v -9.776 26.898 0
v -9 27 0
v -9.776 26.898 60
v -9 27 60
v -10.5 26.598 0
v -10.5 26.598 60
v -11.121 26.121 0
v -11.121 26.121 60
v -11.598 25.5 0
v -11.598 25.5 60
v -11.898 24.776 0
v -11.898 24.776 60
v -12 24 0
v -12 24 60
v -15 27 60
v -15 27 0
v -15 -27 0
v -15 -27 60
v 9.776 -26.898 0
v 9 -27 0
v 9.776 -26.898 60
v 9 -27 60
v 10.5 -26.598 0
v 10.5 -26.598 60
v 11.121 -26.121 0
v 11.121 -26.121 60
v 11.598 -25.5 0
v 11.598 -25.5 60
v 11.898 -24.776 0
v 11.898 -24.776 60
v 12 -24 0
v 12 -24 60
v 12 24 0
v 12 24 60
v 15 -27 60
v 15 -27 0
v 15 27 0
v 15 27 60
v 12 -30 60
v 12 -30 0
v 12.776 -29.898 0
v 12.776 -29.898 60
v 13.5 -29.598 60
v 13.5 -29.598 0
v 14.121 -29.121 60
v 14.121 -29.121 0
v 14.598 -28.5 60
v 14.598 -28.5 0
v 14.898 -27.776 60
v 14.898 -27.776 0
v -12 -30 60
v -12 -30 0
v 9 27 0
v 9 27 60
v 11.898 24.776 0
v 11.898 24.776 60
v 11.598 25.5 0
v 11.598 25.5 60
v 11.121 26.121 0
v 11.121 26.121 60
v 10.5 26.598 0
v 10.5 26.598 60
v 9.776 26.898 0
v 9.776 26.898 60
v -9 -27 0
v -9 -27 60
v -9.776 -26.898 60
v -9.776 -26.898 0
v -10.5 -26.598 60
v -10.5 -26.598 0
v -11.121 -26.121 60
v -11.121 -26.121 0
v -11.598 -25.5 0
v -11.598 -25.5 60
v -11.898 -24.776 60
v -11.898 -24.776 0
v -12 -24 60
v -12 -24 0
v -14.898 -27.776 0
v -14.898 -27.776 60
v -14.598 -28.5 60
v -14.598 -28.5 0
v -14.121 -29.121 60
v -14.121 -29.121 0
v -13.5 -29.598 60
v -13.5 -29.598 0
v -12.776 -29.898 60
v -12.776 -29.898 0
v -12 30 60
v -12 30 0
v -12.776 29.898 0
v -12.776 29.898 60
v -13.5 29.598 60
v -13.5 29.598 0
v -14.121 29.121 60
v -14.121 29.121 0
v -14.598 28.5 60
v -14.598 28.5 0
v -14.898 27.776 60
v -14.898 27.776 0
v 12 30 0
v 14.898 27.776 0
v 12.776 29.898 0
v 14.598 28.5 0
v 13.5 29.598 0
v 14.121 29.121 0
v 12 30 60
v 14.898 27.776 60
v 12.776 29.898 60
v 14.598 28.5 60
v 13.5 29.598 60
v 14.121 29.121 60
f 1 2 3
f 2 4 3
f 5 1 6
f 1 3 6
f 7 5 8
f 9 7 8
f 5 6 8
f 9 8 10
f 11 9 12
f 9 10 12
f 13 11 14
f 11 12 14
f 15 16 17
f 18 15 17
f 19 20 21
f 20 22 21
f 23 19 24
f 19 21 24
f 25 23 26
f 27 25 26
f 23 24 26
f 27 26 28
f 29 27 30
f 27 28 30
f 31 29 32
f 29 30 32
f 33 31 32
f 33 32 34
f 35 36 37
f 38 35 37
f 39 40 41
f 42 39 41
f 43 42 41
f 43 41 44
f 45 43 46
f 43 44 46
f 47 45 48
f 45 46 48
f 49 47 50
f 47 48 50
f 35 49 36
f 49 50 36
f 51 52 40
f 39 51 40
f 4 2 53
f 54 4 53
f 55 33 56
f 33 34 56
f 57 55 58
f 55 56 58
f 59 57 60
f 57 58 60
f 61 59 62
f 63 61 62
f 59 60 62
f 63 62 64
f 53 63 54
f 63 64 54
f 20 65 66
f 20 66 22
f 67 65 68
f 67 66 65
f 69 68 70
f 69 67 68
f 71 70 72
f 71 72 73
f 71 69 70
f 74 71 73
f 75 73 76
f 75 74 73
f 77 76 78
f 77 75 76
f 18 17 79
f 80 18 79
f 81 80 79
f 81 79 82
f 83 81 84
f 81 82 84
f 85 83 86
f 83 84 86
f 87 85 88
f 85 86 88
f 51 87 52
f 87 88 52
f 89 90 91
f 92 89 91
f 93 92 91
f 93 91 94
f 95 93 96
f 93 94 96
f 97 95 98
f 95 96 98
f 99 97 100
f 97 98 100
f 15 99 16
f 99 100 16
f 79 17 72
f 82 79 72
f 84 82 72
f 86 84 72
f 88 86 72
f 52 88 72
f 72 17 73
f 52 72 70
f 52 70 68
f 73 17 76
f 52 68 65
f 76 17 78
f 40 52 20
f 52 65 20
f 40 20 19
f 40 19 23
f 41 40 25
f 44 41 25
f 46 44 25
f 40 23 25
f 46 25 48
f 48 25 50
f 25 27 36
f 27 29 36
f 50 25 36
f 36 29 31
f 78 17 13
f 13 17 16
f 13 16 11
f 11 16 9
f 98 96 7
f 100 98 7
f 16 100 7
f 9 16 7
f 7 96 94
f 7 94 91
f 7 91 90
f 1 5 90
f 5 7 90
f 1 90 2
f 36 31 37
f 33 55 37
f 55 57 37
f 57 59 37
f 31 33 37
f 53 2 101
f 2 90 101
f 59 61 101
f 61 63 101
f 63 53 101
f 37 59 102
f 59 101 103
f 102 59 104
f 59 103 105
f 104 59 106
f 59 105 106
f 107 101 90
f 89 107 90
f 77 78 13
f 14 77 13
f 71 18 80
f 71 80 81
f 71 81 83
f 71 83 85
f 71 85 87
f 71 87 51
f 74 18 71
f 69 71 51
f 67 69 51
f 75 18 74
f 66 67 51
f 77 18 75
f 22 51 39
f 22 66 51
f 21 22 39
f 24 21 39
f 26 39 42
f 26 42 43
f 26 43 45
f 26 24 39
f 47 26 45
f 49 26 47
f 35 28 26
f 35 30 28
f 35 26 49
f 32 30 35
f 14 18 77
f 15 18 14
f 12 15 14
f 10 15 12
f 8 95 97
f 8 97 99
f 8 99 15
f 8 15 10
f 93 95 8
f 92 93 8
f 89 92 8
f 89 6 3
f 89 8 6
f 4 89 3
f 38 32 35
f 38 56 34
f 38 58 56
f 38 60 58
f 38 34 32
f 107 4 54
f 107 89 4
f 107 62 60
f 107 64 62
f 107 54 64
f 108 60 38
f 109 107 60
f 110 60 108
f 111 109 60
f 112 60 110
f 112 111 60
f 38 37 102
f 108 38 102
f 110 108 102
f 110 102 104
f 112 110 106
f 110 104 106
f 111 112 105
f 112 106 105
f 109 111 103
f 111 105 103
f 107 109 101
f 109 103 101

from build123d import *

# Parameters (mm, degrees)
SZKIC1_W                    = 24
SZKIC1_H                    = 54
DODANIE_WYCI_GNI_CIE1_DEPTH = 60
ZAOKR_GLENIE1_R             = 3


with BuildPart() as part:
    # Szkic1 → Dodanie-wyciągnięcie1 (new body)
    with BuildSketch(Plane.XY):
        with BuildLine():
            Line((-12, -30), (12, -30))
            ThreePointArc((12, -30), (14.121320344, -29.121320344), (15, -27))
            Line((15, -27), (15, 27))
            ThreePointArc((15, 27), (14.121320344, 29.121320344), (12, 30))
            Line((12, 30), (-12, 30))
            ThreePointArc((-12, 30), (-14.121320344, 29.121320344), (-15, 27))
            Line((-15, 27), (-15, -27))
            ThreePointArc((-15, -27), (-14.121320344, -29.121320344), (-12, -30))
        make_face()
        Rectangle(SZKIC1_W, SZKIC1_H, mode=Mode.SUBTRACT)
    extrude(amount=DODANIE_WYCI_GNI_CIE1_DEPTH)

    # Zaokrąglenie1
    zaokr_glenie1_edges = [part.edges().sort_by_distance(p)[0] for p in [
        (-12, 27, 30),
        (-12, -27, 30),
        (12, -27, 30),
        (12, 27, 30),
    ]]
    fillet(zaokr_glenie1_edges, radius=ZAOKR_GLENIE1_R)


solid = part.part
